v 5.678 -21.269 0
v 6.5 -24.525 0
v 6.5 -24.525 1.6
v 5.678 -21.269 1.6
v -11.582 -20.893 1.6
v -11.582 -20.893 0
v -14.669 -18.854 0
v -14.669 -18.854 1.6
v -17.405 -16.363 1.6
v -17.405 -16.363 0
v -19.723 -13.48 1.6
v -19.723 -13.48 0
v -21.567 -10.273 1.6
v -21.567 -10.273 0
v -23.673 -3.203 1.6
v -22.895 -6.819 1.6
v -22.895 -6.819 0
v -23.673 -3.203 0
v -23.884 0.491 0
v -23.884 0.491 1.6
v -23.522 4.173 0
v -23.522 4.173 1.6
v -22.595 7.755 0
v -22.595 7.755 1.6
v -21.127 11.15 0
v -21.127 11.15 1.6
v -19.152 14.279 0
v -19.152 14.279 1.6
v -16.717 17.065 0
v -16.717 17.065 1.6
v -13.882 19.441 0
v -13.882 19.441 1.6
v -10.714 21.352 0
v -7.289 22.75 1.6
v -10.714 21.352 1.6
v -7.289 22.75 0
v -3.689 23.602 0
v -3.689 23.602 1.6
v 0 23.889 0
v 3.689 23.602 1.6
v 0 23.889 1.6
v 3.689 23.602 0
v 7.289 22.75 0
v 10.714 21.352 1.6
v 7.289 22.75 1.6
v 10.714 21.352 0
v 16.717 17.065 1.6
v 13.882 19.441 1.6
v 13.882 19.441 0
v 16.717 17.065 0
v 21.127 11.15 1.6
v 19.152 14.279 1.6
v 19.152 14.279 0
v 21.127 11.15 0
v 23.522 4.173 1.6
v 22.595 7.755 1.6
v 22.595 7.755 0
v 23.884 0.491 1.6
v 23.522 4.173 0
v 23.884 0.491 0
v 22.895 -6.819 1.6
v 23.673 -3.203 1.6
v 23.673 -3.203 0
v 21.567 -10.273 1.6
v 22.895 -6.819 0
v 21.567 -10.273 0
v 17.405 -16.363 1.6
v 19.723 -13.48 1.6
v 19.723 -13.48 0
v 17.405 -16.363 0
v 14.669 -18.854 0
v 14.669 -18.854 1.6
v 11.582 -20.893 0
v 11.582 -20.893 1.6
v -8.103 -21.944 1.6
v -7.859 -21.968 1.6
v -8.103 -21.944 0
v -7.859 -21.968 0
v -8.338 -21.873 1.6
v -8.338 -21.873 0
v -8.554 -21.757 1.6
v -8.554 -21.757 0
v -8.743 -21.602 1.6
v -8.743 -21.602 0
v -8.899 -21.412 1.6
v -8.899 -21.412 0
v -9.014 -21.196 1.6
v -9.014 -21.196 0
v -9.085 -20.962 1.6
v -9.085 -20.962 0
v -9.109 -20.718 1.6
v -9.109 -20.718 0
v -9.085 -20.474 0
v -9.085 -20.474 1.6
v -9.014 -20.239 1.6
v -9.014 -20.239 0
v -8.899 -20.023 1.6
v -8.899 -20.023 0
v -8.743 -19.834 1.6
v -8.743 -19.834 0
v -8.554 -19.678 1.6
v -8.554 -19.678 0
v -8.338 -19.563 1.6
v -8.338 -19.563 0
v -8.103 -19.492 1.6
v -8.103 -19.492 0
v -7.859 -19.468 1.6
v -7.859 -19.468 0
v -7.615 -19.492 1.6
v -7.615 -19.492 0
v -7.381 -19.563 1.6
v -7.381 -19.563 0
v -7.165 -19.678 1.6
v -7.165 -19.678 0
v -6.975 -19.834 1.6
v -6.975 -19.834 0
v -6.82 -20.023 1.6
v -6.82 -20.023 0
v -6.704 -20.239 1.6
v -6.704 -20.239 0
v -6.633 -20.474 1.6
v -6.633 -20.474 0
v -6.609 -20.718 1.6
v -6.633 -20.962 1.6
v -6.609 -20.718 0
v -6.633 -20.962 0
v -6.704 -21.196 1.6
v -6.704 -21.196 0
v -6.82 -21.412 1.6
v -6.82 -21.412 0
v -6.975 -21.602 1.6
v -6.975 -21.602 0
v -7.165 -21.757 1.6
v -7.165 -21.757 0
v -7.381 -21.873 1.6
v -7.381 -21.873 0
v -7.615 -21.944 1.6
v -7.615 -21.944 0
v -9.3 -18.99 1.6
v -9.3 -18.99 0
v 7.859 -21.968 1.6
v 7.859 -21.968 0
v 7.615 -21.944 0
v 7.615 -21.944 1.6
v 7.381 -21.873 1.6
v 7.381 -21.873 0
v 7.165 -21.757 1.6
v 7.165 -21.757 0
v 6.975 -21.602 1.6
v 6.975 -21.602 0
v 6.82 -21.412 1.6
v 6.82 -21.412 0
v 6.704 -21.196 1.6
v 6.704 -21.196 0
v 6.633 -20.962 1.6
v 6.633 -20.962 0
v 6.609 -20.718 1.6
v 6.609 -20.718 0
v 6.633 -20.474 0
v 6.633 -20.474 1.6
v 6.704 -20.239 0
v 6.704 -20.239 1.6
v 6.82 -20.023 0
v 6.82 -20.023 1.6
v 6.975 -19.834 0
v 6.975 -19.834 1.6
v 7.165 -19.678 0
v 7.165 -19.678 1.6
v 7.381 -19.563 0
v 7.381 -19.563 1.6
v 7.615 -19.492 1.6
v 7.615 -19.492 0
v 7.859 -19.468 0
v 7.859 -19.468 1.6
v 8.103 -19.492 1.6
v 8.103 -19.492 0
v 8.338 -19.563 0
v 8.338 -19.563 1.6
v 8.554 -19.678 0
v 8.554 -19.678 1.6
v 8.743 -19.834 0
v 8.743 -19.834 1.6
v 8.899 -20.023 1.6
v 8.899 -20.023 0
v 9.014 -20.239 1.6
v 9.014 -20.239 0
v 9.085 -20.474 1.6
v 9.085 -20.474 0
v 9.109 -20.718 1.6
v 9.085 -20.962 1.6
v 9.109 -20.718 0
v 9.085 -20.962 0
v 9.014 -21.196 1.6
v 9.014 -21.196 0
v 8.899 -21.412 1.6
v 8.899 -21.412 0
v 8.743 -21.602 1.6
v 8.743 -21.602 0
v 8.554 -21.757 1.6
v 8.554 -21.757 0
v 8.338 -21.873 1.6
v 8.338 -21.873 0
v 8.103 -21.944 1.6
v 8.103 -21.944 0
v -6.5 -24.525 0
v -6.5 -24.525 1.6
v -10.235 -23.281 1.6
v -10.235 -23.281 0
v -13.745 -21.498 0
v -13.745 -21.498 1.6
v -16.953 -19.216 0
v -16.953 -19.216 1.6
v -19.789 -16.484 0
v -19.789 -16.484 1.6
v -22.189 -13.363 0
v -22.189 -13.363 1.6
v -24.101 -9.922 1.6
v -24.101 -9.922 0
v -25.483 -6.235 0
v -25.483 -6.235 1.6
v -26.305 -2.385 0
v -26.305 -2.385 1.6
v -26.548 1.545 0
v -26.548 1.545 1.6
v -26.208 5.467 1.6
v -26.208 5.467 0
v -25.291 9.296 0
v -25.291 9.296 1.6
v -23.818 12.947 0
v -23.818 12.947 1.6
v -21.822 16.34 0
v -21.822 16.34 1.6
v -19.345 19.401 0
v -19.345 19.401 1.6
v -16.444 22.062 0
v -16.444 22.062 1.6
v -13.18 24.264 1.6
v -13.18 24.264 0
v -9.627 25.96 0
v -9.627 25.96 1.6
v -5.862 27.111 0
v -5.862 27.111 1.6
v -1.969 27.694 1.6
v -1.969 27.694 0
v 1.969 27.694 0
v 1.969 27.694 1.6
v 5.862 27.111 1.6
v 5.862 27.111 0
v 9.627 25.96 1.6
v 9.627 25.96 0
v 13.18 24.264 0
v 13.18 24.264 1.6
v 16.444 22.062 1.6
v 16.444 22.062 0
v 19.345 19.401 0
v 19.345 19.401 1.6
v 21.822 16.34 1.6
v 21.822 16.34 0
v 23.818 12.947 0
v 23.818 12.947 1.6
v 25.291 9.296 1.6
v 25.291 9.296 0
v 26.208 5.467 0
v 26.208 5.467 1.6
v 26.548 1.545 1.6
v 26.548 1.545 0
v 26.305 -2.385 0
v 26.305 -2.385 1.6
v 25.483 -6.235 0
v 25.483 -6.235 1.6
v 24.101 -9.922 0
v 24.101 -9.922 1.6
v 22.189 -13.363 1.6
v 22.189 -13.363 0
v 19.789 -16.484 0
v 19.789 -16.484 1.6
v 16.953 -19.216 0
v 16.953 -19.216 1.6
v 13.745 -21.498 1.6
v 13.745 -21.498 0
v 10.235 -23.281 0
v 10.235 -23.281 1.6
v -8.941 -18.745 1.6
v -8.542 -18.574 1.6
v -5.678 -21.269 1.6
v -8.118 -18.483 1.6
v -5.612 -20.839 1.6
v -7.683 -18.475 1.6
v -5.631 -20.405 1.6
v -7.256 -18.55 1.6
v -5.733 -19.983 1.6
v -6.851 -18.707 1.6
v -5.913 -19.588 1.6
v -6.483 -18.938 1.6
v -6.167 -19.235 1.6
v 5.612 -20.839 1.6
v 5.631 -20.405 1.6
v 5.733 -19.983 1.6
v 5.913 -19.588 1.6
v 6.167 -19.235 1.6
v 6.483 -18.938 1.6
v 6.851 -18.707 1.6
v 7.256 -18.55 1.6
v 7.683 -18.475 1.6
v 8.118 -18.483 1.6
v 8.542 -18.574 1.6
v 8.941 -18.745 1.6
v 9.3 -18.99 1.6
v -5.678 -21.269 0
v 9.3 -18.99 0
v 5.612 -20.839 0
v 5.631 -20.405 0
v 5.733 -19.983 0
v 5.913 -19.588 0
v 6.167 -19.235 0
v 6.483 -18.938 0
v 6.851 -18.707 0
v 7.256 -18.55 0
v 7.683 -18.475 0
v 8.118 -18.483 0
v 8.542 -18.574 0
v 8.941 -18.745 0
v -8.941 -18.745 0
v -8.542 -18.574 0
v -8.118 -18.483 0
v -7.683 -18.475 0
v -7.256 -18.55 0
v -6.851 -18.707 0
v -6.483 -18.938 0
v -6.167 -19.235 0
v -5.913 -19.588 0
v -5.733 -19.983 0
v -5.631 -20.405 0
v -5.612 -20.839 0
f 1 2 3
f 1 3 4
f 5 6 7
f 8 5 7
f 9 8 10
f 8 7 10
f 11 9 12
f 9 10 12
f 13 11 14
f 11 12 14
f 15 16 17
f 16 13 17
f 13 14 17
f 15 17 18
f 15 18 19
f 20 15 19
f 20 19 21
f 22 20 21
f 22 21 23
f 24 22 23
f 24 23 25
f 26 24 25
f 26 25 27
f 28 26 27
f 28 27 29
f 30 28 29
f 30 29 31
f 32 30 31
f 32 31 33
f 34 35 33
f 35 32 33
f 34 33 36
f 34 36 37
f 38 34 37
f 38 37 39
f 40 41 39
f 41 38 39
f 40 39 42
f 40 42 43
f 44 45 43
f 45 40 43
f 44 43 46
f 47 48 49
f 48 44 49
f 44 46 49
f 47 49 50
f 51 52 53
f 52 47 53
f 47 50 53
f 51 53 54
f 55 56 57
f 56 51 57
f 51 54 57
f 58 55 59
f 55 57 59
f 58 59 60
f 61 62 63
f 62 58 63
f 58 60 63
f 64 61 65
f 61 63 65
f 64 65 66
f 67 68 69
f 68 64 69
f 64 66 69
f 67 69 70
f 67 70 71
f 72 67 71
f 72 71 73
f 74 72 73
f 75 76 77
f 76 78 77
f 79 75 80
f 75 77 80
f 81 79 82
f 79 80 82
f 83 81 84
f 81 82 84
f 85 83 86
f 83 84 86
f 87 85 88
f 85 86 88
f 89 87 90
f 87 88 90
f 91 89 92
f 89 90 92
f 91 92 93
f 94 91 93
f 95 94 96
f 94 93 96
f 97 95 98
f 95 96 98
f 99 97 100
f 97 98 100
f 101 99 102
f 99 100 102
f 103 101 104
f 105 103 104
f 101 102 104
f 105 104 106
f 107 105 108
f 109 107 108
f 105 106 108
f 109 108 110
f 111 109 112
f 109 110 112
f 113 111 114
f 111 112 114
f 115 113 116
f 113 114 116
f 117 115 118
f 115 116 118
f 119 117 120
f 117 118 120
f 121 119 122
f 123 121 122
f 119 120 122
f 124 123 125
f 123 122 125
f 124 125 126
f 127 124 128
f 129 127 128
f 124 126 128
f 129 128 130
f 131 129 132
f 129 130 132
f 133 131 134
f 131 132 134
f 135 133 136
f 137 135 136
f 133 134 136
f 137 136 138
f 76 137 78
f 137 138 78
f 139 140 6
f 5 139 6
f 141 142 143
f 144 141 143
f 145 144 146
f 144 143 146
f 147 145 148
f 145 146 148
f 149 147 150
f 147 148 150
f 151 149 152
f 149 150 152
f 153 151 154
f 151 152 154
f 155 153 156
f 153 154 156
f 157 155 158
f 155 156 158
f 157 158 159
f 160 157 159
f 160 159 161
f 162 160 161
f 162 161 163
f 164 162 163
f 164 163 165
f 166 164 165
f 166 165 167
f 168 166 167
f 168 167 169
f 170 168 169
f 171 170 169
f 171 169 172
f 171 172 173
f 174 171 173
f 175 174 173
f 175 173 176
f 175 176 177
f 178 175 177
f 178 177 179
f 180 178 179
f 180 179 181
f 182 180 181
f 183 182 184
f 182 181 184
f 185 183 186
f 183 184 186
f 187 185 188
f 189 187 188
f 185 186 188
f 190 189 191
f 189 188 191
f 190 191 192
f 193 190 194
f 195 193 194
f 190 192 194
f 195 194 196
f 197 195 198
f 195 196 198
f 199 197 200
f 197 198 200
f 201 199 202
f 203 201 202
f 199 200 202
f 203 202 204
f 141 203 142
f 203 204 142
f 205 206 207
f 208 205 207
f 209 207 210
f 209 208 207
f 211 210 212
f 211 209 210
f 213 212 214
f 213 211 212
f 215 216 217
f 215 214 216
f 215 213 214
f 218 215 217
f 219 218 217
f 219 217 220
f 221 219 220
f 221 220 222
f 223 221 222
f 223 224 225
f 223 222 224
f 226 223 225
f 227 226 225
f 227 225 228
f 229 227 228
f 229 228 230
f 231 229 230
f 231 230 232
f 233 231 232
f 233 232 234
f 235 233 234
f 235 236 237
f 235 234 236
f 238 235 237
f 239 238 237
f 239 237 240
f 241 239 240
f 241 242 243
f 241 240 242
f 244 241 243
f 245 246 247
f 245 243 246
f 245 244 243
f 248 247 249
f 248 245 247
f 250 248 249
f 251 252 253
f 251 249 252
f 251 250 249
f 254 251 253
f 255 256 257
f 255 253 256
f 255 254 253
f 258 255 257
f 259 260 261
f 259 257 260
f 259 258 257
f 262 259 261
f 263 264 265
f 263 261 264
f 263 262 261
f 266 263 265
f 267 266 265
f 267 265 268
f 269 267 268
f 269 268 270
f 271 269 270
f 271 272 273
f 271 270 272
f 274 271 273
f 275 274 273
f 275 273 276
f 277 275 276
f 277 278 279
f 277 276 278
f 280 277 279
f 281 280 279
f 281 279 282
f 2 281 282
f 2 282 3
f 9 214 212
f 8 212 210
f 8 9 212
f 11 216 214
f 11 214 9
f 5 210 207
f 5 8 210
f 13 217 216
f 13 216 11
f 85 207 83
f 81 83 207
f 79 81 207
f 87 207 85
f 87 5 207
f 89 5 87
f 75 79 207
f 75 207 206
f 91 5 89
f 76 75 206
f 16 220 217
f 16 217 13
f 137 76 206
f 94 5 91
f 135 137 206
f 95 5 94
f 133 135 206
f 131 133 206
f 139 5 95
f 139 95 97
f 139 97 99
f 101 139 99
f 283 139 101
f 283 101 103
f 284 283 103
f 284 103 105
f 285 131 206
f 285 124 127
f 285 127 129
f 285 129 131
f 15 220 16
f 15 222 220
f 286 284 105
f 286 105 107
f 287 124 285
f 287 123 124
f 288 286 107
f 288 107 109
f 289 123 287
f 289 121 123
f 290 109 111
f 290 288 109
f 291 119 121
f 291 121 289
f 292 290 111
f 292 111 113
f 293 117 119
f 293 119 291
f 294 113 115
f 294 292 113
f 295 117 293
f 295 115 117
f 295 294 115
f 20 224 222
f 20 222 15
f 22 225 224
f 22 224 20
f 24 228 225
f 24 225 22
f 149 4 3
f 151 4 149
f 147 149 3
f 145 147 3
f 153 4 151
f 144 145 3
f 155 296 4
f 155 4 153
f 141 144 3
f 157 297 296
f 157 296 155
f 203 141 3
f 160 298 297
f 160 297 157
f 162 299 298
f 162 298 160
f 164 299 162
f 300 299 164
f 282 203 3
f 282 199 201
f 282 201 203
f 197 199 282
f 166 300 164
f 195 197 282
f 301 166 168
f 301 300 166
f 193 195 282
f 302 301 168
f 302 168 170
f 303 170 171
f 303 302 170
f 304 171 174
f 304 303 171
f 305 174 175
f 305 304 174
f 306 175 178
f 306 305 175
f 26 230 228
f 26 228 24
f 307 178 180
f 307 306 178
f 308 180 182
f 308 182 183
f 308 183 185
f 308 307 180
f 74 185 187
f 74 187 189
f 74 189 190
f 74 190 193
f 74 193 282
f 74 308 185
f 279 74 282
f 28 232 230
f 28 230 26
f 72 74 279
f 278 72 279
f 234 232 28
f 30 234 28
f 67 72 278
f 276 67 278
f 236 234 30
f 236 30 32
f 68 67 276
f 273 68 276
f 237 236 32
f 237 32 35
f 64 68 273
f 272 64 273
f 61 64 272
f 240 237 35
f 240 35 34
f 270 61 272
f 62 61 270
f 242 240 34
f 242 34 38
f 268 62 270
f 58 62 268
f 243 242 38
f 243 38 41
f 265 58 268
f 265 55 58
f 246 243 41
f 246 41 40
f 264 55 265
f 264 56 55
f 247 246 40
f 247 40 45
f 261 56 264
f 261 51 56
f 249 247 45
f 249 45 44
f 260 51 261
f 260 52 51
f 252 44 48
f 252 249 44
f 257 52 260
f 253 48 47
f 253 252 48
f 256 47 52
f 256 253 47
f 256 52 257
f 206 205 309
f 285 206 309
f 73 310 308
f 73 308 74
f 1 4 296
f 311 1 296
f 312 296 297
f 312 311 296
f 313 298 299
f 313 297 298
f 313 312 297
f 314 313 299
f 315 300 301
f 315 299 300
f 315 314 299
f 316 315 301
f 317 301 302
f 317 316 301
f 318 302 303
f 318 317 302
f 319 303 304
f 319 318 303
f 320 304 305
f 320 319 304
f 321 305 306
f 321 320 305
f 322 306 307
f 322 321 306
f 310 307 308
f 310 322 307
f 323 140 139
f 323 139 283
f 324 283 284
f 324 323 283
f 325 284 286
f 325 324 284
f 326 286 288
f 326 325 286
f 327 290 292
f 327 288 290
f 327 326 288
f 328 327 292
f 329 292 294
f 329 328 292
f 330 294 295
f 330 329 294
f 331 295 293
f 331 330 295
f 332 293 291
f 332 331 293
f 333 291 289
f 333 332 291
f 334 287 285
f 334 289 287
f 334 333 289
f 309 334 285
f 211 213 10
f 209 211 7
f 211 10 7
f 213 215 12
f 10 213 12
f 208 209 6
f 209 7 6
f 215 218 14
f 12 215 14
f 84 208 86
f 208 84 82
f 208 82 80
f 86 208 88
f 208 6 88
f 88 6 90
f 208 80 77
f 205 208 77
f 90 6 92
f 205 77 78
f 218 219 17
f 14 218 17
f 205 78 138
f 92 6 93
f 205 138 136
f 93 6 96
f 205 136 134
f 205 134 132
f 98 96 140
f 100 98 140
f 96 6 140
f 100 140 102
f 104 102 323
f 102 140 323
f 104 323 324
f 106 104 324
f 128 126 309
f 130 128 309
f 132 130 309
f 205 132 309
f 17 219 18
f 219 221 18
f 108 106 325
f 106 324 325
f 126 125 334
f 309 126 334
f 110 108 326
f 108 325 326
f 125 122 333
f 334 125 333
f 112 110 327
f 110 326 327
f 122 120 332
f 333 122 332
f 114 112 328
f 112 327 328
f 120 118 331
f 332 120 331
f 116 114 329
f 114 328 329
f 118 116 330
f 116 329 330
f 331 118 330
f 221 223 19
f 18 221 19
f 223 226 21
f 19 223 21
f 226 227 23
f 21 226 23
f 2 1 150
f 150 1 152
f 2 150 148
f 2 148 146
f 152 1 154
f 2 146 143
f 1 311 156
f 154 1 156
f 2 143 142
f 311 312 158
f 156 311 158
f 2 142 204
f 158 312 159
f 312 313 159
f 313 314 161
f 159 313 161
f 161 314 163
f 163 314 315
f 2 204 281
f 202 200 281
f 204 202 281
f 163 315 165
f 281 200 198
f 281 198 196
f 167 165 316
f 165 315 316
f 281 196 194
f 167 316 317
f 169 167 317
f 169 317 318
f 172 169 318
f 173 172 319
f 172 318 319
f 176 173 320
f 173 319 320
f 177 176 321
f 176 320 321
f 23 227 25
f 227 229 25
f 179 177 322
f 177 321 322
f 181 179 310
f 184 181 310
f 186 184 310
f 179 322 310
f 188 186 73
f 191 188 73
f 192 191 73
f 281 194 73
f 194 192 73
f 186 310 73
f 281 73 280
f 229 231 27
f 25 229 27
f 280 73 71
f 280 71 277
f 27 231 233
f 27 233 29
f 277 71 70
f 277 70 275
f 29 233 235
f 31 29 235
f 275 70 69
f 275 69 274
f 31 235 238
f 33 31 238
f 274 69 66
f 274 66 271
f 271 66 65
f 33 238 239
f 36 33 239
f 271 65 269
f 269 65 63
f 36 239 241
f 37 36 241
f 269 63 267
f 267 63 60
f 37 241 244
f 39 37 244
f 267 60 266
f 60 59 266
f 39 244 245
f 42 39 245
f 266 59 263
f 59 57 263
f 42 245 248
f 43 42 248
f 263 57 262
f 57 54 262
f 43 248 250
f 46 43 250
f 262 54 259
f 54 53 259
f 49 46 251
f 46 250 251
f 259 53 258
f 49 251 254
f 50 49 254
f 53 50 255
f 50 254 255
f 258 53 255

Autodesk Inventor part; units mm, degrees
ref_plane "WorkPlane1" through (0, 0, 0) normal (0, 0, 1) x (1, 0, 0)
ref_plane "Work Plane2" through (0, 0, -1.6) normal (0, 0, 1) x (1, 0, 0)
ref_plane "WorkPlane2" through (0, 0, 1) normal (0, 0, 1) x (1, 0, 0)
sketch "Sketch1" plane through (0, 0, 0) normal (0, 0, 1) x (1, 0, 0)
  point P0 (0, 0)
sketch "Sketch2" plane through (0, 0, 0) normal (0, 0, 1) x (1, 0, 0)
  line L0 (6.5, -24.5254) -> (5.6777, -21.2687)
  arc A0 (9.3003, -18.9899) -> (5.6777, -21.2687) centre (7.8592, -20.7178) ccw
  line L1 (9.3003, -18.9899) -> (11.5824, -20.8932)
  arc A1 (11.5824, -20.8932) -> (-11.5824, -20.8932) centre (0, 0) ccw
  line L2 (-9.3003, -18.9899) -> (-11.5824, -20.8932)
  arc A2 (-5.6777, -21.2687) -> (-9.3003, -18.9899) centre (-7.8592, -20.7178) ccw
  line L3 (-6.5, -24.5254) -> (-5.6777, -21.2687)
  arc A3 (6.5, -24.5254) -> (-6.5, -24.5254) centre (0, 1.2167) ccw
  line L4 (0, 1.2167) -> (-6.5, -24.5254) construction
  line L5 (0, 1.2167) -> (6.5, -24.5254) construction
  dimension "d2" = 26.55
  dimension "d4" = 0
  dimension "d6" = 23.8889
  dimension "d8" = 1.2167
  dimension "d10" = 6.5
  dimension "d12" = 6.5
  dimension "d14" = 2.25
  dimension "d16" = 2.25
  dimension "d18" = 23.3
  dimension "d20" = 23.3
  dimension "d22" = 36
  dimension "d24" = 36
extrude "Extrusion1" add sketch "Sketch2" along normal blind 1.6
sketch "Sketch3" plane through (0, 0, 1.6) normal (0, 0, 1) x (1, 0, 0)
  arc A0 (-5.6777, -21.2687) -> (-9.3003, -18.9899) centre (-7.8592, -20.7178) ccw projected
hole "Hole1" at (-7.8592, -20.7178, 1.6) direction (0, 0, -1) diameter 2.5 end through all
sketch "Sketch4" plane through (0, 0, 1.6) normal (0, 0, 1) x (1, 0, 0)
  arc A0 (9.3003, -18.9899) -> (5.6777, -21.2687) centre (7.8592, -20.7178) ccw projected
hole "Hole2" at (7.8592, -20.7178, 1.6) direction (0, 0, -1) diameter 2.5 end through all
equation "\"d29\" = Diam5"
equation "\"d36\" = Diam5"
equation "\"d2\" = 0.5 * Diam2"
equation "\"d6\" = 0.5 * msp_dd1"
equation "\"d8\" = -0.5 * msp_dd1 + 0.5 * Diam2 - 0.222222 * ParA"
equation "\"d10\" = 2.6 * Diam5"
equation "\"d12\" = 2.6 * Diam5"
equation "\"d14\" = 0.9 * Diam5"
equation "\"d16\" = 0.9 * Diam5"
equation "\"d18\" = 1.3 * Diam5 + 0.5 * Diam2 - ParA"
equation "\"d20\" = 1.3 * Diam5 + 0.5 * Diam2 - ParA"
equation "\"d25\" = ParS"
equation "\"Diam5\" = 2.5"
equation "\"ParA\" = 6.5"
equation "\"ParS\" = 1.6"
equation "\"Diam2\" = 53.1"
equation "\"msp_dd1\" = -b + Diam2 - 0.111111 * ParA"
equation "\"msp_pom\" = 0.5 * Diam2 - b"
equation "\"TEMPLATE\" = 1.2345"
properties part number "ANSI B 27.7M - 3BMI-50" material "Steel, Mild"
